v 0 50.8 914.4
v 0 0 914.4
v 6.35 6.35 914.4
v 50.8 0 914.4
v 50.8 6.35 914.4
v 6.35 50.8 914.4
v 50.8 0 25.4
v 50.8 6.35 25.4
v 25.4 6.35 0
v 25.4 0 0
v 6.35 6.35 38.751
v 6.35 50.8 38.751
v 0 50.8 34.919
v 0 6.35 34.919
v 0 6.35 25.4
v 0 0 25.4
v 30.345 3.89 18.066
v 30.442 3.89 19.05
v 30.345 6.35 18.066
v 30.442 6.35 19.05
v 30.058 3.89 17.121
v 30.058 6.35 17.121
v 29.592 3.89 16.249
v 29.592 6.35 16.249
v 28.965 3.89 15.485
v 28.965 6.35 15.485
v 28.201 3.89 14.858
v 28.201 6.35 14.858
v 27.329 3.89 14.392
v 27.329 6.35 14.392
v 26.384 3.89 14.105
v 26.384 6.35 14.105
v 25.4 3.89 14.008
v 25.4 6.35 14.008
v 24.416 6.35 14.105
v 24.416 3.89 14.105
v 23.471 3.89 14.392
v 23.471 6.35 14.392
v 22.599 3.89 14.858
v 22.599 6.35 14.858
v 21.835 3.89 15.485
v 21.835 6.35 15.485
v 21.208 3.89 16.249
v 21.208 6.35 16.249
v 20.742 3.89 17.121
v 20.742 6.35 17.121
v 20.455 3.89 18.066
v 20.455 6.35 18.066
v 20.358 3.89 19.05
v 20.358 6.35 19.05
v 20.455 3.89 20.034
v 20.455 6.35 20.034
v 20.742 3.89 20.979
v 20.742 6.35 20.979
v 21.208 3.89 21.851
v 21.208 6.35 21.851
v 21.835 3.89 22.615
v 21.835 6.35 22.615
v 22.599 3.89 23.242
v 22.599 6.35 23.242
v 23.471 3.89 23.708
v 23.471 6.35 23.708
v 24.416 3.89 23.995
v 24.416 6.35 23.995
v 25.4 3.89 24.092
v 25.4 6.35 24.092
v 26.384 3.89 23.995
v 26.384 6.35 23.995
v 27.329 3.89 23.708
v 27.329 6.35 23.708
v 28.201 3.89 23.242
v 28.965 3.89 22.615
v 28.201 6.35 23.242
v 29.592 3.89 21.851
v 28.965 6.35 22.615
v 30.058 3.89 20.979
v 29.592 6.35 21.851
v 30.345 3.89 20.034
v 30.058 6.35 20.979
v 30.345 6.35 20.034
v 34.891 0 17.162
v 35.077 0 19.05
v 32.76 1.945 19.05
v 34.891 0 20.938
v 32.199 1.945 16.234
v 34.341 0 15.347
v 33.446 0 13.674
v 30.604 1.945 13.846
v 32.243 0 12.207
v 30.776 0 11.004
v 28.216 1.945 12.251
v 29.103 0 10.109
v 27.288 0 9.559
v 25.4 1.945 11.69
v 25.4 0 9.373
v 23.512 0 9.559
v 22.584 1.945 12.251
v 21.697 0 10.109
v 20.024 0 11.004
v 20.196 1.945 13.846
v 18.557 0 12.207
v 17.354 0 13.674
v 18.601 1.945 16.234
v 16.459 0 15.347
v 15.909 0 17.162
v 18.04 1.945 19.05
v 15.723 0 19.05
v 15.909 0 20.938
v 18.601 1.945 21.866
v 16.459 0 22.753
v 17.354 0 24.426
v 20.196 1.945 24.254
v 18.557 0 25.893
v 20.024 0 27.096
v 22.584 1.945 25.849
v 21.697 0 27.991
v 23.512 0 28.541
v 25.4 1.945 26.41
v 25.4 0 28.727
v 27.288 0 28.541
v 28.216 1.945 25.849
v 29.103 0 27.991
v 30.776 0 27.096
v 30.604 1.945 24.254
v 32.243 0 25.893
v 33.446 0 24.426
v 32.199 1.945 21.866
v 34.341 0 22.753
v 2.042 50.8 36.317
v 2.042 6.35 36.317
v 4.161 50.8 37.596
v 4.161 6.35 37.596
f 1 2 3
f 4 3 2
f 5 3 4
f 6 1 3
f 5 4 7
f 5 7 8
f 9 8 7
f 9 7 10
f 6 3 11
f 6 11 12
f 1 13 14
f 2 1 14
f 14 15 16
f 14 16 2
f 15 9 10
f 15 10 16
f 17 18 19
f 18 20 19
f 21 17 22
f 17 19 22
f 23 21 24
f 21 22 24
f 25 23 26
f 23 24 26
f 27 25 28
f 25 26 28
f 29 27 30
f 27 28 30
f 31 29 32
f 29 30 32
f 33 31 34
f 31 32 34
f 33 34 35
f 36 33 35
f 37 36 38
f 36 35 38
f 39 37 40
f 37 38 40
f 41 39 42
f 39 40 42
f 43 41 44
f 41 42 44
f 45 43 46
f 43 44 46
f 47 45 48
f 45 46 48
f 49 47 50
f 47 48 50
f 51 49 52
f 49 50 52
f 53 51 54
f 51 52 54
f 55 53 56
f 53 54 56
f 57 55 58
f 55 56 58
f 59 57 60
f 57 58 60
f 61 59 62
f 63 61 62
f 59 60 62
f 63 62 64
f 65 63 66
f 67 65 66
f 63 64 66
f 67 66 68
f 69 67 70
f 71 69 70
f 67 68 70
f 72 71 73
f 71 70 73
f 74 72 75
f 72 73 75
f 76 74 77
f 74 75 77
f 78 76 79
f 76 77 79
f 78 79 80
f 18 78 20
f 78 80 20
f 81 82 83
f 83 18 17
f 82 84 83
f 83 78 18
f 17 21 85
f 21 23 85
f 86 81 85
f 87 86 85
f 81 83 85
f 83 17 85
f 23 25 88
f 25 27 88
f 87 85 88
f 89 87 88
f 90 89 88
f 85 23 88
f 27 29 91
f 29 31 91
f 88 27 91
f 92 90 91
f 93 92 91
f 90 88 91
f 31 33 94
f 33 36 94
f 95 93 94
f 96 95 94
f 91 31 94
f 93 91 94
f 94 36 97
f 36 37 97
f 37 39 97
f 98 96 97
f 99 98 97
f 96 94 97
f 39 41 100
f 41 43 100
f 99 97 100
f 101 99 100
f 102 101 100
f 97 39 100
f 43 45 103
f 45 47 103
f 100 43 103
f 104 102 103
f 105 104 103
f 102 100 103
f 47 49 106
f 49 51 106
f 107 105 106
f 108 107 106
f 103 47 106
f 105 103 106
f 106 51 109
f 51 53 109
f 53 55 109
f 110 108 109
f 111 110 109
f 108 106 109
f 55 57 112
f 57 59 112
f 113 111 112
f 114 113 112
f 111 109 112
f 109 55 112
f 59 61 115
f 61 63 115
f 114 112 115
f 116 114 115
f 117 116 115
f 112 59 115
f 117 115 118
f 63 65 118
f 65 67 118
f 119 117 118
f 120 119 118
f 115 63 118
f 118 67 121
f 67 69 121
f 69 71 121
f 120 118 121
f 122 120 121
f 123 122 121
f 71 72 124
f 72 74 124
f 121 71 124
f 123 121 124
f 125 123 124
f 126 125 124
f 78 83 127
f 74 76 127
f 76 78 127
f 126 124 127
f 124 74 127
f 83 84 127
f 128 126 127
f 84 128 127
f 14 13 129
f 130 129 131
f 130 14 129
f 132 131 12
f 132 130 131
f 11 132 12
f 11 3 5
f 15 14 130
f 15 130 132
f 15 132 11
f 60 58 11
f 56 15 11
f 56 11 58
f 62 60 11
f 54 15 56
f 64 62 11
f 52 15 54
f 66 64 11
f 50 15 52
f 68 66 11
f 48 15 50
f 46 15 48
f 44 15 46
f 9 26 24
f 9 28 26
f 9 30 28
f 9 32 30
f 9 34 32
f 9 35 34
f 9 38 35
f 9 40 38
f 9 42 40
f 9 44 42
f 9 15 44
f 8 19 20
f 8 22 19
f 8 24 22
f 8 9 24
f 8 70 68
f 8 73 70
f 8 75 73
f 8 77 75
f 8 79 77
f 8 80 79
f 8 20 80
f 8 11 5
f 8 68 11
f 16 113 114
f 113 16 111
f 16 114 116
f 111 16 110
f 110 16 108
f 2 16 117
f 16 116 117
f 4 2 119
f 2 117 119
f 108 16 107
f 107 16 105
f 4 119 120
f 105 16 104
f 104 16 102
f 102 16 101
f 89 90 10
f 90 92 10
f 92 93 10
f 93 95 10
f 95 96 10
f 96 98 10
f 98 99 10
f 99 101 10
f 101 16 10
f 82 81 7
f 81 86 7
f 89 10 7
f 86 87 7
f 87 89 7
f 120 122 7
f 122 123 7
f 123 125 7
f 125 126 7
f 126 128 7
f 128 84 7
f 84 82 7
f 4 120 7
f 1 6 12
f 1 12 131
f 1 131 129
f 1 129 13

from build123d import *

# Parameters (mm, degrees)
BOSS_EXTRUDE1_DEPTH                                 = 914.4
CUT_EXTRUDE1_REACH                                  = 918.888
SKETCH2_R                                           = 43.18
CUT_EXTRUDE2_DEPTH                                  = 1219.2
CSK_FOR_3_8_FLAT_HEAD_MACHINE_SCREW_100_D           = 10.0838
CSK_FOR_3_8_FLAT_HEAD_MACHINE_SCREW_100_CSINK_D     = 19.3548
CSK_FOR_3_8_FLAT_HEAD_MACHINE_SCREW_100_CSINK_ANGLE = 100


with BuildPart() as part:
    # Sketch1 → Boss-Extrude1 (new body)
    with BuildSketch(Plane.XY):
        Polygon((0, 50.8), (0, 0), (50.8, 0), (50.8, 6.35), (6.35, 6.35), (6.35, 50.8), align=None)
    extrude(amount=BOSS_EXTRUDE1_DEPTH)

    # Sketch2 → Cut-Extrude1 (cut, up to next)
    with BuildSketch(Plane(origin=(0, 6.35, 0), x_dir=(1, 0, 0), z_dir=(0, 1, 0)), mode=Mode.PRIVATE) as cut_extrude1_sk1:
        with Locations((25.4, 0)):
            Circle(SKETCH2_R)
    cut_extrude1_tool1 = extrude(cut_extrude1_sk1.sketch, amount=CUT_EXTRUDE1_REACH, mode=Mode.PRIVATE) & part.part
    add(cut_extrude1_tool1.solids().sort_by_distance((25.4, 6.35, 0))[0], mode=Mode.SUBTRACT)

    # Sketch3 → Cut-Extrude2 (cut)
    with BuildSketch(Plane(origin=(0, 6.35, 0), x_dir=(1, 0, 0), z_dir=(0, 1, 0))):
        with BuildLine():
            Line((25.4, 0), (-1.540768363, -26.940768363))
            ThreePointArc((-1.540768363, -26.940768363), (25.4, 38.1), (52.340768363, -26.940768363))
            Line((52.340768363, -26.940768363), (25.4, 0))
        make_face()
    extrude(amount=-CUT_EXTRUDE2_DEPTH, mode=Mode.SUBTRACT)

    # CSK for 3/8 Flat Head Machine Screw (100)1 (through all)
    with Locations(Plane(origin=(0, 0, 0), x_dir=(-1, 0, 0), z_dir=(0, -1, 0))):
        with Locations((-25.4, -19.05)):
            CounterSinkHole(CSK_FOR_3_8_FLAT_HEAD_MACHINE_SCREW_100_D / 2, CSK_FOR_3_8_FLAT_HEAD_MACHINE_SCREW_100_CSINK_D / 2, counter_sink_angle=CSK_FOR_3_8_FLAT_HEAD_MACHINE_SCREW_100_CSINK_ANGLE)


solid = part.part
